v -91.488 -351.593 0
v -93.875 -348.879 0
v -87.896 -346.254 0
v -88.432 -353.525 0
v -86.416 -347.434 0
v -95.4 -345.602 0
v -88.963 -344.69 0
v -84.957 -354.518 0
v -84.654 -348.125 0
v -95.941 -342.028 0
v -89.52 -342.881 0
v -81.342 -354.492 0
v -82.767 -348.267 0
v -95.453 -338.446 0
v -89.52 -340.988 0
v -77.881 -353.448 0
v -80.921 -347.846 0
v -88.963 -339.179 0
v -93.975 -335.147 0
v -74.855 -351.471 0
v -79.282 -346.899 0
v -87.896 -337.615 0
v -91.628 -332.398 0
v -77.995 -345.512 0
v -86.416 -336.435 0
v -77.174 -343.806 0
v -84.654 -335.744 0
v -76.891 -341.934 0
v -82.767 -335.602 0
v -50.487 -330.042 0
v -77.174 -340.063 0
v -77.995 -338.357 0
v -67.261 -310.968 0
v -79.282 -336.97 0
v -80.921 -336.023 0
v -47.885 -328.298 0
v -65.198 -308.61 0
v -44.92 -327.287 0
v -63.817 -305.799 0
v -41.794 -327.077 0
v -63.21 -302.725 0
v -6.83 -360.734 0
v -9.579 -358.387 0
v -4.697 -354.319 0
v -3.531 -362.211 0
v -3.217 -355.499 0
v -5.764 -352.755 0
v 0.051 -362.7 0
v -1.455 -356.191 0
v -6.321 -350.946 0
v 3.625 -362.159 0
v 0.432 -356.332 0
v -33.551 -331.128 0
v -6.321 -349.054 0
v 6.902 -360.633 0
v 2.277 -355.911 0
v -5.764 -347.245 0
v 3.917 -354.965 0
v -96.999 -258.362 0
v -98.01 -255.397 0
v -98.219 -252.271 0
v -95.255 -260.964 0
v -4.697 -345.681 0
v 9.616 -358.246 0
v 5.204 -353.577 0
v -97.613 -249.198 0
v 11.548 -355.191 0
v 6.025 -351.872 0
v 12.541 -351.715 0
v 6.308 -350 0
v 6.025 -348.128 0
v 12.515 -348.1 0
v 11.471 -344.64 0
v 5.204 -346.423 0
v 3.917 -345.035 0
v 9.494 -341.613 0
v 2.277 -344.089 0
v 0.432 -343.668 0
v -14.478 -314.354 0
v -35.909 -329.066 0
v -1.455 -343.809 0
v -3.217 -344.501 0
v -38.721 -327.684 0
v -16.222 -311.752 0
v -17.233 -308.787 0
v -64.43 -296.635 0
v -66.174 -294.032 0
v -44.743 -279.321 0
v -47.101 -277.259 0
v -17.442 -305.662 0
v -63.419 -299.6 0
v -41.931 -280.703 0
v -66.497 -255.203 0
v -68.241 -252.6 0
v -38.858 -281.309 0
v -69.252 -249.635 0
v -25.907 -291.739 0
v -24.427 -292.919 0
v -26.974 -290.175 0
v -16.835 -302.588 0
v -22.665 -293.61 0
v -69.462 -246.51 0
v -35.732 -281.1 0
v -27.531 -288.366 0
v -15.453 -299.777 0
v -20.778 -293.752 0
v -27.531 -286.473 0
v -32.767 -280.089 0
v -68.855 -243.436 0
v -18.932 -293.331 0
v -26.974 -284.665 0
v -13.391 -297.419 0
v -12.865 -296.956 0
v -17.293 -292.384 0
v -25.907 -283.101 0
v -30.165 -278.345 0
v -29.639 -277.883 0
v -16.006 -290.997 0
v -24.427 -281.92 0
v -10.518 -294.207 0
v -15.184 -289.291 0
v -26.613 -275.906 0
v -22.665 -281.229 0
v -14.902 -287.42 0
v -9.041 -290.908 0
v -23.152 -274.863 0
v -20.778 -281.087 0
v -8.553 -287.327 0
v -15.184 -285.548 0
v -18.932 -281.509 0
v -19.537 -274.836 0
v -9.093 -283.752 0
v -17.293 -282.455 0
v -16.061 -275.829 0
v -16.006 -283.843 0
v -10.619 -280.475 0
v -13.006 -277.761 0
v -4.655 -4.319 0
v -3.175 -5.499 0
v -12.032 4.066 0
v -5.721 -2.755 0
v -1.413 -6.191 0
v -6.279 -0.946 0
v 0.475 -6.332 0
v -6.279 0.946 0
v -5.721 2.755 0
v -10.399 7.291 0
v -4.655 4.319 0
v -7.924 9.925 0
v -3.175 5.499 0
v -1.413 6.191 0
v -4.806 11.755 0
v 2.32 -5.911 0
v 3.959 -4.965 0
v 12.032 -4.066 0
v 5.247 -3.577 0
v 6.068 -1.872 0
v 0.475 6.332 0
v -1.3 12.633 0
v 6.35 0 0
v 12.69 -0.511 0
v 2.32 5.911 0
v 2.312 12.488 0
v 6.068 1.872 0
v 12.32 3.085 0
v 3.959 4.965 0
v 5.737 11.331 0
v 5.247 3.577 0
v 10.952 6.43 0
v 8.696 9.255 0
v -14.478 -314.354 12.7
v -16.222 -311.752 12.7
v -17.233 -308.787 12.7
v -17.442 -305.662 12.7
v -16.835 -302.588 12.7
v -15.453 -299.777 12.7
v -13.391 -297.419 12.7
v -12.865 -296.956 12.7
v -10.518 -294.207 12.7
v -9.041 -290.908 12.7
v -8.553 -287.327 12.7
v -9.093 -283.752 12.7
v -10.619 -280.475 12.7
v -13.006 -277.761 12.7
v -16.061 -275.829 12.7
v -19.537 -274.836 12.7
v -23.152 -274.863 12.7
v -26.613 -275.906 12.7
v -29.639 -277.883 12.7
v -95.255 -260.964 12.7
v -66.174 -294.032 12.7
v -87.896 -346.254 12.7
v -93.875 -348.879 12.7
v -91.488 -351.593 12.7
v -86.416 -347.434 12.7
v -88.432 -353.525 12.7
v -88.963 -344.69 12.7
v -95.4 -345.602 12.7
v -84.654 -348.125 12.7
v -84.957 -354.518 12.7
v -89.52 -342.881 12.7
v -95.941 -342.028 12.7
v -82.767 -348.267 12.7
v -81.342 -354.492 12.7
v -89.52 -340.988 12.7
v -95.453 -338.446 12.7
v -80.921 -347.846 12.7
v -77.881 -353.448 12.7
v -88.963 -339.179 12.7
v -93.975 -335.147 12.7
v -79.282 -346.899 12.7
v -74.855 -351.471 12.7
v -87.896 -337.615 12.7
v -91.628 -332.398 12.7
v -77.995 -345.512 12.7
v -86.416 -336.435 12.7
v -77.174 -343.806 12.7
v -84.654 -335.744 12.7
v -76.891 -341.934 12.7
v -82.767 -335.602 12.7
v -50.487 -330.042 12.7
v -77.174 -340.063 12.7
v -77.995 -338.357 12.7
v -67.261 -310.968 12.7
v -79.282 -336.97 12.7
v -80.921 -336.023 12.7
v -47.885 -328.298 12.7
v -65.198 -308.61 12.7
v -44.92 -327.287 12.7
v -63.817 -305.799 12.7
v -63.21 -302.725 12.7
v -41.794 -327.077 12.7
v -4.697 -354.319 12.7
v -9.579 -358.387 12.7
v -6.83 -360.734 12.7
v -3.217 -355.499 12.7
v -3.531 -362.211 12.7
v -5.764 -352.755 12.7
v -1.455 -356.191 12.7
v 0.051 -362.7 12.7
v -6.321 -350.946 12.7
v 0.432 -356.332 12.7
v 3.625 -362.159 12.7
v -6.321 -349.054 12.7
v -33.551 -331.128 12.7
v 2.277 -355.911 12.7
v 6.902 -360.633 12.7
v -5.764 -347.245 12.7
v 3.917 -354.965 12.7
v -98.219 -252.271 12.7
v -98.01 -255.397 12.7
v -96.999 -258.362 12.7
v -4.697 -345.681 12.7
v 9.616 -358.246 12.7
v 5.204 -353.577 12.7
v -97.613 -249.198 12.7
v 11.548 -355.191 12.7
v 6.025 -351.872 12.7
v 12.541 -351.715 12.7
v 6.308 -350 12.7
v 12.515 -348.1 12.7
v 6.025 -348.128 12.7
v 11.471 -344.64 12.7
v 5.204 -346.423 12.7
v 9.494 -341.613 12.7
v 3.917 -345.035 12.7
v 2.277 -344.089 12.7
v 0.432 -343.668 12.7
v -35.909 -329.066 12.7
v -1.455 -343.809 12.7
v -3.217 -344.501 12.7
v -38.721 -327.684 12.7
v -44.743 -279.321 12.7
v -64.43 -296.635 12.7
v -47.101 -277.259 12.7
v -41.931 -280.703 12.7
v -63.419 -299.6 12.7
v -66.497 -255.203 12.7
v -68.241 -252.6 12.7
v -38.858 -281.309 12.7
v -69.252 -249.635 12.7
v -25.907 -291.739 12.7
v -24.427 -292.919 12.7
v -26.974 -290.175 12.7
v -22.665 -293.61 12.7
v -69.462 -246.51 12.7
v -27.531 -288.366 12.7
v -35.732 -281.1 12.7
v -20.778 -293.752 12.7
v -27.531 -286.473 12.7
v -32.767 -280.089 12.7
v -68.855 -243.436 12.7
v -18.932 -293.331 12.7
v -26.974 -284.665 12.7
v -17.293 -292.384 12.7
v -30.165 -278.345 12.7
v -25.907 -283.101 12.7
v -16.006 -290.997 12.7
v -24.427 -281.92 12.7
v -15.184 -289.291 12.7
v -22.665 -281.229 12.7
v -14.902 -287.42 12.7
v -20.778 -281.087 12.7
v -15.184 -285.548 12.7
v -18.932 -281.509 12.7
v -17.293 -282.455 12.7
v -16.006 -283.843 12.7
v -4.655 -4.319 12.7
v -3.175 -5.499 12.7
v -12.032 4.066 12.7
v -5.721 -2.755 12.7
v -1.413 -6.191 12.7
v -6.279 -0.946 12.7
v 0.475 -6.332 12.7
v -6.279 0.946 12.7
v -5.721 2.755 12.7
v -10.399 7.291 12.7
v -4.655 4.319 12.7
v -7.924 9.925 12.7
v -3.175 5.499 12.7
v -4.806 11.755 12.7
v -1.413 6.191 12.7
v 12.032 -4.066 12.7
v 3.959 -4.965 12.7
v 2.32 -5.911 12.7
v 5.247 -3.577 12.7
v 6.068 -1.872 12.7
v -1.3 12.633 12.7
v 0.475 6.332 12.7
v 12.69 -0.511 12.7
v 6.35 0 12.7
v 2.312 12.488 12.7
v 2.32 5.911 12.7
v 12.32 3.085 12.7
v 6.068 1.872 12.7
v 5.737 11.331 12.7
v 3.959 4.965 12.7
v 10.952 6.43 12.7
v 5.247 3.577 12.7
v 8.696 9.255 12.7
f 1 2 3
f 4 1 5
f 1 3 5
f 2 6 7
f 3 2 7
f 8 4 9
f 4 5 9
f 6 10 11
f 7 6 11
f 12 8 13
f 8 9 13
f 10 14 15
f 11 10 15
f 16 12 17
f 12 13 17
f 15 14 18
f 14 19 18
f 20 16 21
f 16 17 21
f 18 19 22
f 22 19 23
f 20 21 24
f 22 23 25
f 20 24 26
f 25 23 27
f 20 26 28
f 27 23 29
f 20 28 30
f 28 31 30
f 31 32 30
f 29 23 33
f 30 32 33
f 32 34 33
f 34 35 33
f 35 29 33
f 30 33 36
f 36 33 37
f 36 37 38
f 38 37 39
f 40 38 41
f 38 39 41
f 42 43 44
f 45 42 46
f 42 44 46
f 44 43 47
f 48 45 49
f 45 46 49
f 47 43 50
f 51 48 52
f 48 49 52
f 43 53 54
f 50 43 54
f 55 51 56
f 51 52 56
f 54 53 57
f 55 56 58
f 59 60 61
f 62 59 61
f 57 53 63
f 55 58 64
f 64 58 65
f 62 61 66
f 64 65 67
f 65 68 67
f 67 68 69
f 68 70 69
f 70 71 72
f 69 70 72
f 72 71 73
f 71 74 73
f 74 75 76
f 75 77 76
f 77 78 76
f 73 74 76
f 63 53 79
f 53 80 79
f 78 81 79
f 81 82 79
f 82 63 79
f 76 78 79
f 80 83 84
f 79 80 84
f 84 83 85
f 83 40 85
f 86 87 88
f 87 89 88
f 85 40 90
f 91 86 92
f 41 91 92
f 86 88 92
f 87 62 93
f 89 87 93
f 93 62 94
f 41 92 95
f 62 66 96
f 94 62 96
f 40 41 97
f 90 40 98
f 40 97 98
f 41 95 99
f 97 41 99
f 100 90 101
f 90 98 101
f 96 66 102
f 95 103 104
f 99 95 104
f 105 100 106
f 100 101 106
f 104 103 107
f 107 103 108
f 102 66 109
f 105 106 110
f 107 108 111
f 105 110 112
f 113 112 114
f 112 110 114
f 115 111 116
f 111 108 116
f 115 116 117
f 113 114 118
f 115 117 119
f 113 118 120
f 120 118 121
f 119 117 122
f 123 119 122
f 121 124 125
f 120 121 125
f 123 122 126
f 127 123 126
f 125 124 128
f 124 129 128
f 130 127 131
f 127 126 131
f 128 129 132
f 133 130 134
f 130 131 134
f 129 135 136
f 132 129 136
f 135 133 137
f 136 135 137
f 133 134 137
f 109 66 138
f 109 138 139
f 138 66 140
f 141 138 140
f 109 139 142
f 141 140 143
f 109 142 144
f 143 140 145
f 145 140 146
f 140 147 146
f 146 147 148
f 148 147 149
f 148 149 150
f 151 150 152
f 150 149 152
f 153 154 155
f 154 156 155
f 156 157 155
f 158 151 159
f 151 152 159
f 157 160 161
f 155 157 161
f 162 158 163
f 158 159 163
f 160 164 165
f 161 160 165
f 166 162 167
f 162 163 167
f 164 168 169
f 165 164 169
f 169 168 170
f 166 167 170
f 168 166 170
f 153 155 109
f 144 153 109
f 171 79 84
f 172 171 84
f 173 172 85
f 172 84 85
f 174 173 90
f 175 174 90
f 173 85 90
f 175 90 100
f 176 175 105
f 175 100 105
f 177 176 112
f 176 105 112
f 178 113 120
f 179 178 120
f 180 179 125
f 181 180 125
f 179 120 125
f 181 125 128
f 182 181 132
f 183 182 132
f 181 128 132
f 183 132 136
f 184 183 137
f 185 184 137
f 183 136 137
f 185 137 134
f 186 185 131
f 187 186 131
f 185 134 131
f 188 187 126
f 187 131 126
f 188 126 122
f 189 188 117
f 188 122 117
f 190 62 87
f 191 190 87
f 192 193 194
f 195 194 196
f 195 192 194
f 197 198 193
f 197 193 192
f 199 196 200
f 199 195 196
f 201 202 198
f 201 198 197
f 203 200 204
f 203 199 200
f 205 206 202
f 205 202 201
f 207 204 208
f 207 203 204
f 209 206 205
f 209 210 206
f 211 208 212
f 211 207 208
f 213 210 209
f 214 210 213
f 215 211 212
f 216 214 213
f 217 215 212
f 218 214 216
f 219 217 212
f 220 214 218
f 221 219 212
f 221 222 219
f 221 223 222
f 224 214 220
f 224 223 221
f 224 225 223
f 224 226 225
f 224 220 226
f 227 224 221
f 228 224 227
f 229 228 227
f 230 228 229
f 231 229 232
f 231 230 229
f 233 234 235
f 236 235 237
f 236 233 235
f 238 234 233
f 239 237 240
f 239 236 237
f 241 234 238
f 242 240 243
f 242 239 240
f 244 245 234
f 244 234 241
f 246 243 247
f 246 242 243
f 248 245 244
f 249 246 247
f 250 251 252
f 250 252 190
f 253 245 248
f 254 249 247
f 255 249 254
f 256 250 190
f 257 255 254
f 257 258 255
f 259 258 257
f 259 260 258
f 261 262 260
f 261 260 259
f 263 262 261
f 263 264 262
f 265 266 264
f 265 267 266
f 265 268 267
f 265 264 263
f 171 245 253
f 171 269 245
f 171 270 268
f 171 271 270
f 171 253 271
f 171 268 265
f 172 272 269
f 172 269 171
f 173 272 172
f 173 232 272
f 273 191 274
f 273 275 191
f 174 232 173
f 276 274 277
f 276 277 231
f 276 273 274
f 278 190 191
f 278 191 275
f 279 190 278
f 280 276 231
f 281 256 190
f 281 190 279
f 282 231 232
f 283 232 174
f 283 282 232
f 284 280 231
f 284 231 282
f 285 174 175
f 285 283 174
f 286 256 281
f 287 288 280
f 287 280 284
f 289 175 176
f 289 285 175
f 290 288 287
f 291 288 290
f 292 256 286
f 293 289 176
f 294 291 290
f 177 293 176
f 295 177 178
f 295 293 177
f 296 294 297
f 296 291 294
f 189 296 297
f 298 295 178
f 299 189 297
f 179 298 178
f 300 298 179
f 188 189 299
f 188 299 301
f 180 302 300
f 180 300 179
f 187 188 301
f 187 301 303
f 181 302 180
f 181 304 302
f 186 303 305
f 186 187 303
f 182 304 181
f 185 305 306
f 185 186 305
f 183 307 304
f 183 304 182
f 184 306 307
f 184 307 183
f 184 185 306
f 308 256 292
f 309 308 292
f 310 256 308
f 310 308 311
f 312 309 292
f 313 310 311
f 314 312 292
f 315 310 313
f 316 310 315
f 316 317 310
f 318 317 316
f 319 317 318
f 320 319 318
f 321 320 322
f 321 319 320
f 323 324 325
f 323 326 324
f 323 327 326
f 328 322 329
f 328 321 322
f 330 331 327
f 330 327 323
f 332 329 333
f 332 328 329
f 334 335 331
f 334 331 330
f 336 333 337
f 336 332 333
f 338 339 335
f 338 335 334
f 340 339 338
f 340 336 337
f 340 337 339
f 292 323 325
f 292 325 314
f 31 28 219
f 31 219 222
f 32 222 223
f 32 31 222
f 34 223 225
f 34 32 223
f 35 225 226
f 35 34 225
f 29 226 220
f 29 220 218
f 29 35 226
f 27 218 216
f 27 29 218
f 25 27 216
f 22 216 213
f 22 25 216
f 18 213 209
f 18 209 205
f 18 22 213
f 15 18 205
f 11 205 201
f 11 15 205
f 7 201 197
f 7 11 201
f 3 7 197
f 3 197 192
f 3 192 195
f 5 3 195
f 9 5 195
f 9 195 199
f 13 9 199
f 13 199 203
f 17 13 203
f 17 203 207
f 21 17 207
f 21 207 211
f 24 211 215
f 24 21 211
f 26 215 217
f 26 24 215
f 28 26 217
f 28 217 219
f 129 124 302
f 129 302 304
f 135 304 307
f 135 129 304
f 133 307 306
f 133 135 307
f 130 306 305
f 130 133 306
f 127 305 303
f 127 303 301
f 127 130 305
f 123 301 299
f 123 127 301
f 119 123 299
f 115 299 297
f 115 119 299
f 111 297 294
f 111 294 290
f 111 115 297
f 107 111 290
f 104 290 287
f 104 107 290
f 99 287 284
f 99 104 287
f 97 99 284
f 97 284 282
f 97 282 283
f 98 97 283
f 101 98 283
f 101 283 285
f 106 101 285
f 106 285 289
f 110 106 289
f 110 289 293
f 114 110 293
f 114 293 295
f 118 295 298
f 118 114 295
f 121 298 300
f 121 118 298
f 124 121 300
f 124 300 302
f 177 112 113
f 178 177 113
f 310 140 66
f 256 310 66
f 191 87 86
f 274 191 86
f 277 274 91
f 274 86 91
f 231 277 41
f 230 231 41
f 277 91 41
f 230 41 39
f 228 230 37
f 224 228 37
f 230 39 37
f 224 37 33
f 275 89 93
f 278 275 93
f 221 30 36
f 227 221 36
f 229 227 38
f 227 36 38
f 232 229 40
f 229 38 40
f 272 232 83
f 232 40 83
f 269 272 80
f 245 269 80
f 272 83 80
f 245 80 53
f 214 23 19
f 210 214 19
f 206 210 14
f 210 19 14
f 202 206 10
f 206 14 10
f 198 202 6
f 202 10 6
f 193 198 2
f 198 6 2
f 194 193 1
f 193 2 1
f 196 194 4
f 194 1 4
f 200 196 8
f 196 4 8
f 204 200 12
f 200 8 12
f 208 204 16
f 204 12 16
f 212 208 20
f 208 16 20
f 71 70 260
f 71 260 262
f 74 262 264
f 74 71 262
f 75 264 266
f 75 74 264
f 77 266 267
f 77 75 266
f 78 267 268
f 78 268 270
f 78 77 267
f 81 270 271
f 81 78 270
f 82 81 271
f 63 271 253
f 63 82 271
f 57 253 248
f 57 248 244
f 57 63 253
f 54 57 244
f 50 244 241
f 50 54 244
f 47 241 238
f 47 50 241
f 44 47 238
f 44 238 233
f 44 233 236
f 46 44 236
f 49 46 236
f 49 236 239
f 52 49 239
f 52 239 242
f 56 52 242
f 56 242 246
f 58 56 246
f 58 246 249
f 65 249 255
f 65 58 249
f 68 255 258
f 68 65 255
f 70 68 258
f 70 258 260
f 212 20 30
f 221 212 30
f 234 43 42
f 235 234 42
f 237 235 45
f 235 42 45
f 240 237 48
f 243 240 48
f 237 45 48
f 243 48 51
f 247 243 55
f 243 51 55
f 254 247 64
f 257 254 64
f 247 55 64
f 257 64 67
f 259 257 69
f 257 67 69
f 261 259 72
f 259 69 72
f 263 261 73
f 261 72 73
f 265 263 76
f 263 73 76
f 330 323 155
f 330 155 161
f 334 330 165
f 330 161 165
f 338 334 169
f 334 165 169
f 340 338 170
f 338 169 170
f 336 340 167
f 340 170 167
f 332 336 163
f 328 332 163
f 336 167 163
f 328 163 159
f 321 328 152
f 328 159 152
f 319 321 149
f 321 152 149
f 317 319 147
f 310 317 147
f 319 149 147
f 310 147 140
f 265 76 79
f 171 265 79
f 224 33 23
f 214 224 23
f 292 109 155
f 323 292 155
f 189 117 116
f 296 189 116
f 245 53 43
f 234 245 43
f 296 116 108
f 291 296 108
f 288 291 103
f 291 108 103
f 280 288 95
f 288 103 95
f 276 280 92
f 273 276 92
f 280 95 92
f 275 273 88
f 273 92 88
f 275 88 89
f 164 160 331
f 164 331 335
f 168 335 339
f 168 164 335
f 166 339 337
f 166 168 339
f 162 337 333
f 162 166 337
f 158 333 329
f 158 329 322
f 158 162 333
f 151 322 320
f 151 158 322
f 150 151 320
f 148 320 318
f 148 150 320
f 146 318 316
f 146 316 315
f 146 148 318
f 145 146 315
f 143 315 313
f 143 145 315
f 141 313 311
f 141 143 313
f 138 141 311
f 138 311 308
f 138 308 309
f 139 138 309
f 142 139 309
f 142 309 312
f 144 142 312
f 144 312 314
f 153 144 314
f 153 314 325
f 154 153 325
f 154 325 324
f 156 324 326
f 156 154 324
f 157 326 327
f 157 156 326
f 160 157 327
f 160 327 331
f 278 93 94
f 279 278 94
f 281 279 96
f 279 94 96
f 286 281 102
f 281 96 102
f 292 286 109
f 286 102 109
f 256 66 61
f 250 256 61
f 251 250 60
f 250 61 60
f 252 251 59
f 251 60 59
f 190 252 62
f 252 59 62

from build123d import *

# Parameters (mm, degrees)
SKETCH1_R           = 6.35
BOSS_EXTRUDE2_DEPTH = 12.7


with BuildPart() as part:
    # Sketch1 → Boss-Extrude2 (new body)
    with BuildSketch(Plane.XY):
        with BuildLine():
            Line((-12.031647615, 4.065643329), (-97.612603668, -249.198064906))
            ThreePointArc((-97.612603668, -249.198064906), (-98.010291731, -255.396978352), (-95.255242973, -260.964238904))
            Line((-95.255242973, -260.964238904), (-66.174198568, -294.032435491))
            ThreePointArc((-66.174198568, -294.032435491), (-63.209942623, -302.725331079), (-67.260702561, -310.968181978))
            Line((-67.260702561, -310.968181978), (-91.628287065, -332.397678599))
            ThreePointArc((-91.628287065, -332.397678599), (-92.778170458, -350.321343631), (-74.854505426, -351.471227024))
            Line((-74.854505426, -351.471227024), (-50.486920922, -330.041730403))
            ThreePointArc((-50.486920922, -330.041730403), (-41.794025334, -327.077474458), (-33.551174435, -331.128234397))
            Line((-33.551174435, -331.128234397), (-9.579195164, -358.386888249))
            ThreePointArc((-9.579195164, -358.386888249), (8.344469868, -359.536771642), (9.494353261, -341.61310661))
            Line((9.494353261, -341.61310661), (-14.47762601, -314.354452758))
            ThreePointArc((-14.47762601, -314.354452758), (-17.441881955, -305.66155717), (-13.391122016, -297.418706271))
            Line((-13.391122016, -297.418706271), (-12.865473044, -296.956436698))
            ThreePointArc((-12.865473044, -296.956436698), (-11.715589651, -279.032771666), (-29.639254683, -277.882888273))
            Line((-29.639254683, -277.882888273), (-30.164903655, -278.345157846))
            ThreePointArc((-30.164903655, -278.345157846), (-38.857799244, -281.309413791), (-47.100650142, -277.258653852))
            Line((-47.100650142, -277.258653852), (-66.497347204, -255.202575583))
            ThreePointArc((-66.497347204, -255.202575583), (-69.252395961, -249.635315031), (-68.854707898, -243.436401585))
            Line((-68.854707898, -243.436401585), (12.031647615, -4.065643329))
            ThreePointArc((12.031647615, -4.065643329), (4.065643329, 12.031647615), (-12.031647615, 4.065643329))
        make_face()
        with Locations((-21.252363864, -287.419662486)):
            Circle(SKETCH1_R, mode=Mode.SUBTRACT)
        with Locations((-83.241396246, -341.934452812)):
            Circle(SKETCH1_R, mode=Mode.SUBTRACT)
        with Locations((-0.042420952, -349.999997429)):
            Circle(SKETCH1_R, mode=Mode.SUBTRACT)
        Circle(SKETCH1_R, mode=Mode.SUBTRACT)
    extrude(amount=BOSS_EXTRUDE2_DEPTH)


solid = part.part
